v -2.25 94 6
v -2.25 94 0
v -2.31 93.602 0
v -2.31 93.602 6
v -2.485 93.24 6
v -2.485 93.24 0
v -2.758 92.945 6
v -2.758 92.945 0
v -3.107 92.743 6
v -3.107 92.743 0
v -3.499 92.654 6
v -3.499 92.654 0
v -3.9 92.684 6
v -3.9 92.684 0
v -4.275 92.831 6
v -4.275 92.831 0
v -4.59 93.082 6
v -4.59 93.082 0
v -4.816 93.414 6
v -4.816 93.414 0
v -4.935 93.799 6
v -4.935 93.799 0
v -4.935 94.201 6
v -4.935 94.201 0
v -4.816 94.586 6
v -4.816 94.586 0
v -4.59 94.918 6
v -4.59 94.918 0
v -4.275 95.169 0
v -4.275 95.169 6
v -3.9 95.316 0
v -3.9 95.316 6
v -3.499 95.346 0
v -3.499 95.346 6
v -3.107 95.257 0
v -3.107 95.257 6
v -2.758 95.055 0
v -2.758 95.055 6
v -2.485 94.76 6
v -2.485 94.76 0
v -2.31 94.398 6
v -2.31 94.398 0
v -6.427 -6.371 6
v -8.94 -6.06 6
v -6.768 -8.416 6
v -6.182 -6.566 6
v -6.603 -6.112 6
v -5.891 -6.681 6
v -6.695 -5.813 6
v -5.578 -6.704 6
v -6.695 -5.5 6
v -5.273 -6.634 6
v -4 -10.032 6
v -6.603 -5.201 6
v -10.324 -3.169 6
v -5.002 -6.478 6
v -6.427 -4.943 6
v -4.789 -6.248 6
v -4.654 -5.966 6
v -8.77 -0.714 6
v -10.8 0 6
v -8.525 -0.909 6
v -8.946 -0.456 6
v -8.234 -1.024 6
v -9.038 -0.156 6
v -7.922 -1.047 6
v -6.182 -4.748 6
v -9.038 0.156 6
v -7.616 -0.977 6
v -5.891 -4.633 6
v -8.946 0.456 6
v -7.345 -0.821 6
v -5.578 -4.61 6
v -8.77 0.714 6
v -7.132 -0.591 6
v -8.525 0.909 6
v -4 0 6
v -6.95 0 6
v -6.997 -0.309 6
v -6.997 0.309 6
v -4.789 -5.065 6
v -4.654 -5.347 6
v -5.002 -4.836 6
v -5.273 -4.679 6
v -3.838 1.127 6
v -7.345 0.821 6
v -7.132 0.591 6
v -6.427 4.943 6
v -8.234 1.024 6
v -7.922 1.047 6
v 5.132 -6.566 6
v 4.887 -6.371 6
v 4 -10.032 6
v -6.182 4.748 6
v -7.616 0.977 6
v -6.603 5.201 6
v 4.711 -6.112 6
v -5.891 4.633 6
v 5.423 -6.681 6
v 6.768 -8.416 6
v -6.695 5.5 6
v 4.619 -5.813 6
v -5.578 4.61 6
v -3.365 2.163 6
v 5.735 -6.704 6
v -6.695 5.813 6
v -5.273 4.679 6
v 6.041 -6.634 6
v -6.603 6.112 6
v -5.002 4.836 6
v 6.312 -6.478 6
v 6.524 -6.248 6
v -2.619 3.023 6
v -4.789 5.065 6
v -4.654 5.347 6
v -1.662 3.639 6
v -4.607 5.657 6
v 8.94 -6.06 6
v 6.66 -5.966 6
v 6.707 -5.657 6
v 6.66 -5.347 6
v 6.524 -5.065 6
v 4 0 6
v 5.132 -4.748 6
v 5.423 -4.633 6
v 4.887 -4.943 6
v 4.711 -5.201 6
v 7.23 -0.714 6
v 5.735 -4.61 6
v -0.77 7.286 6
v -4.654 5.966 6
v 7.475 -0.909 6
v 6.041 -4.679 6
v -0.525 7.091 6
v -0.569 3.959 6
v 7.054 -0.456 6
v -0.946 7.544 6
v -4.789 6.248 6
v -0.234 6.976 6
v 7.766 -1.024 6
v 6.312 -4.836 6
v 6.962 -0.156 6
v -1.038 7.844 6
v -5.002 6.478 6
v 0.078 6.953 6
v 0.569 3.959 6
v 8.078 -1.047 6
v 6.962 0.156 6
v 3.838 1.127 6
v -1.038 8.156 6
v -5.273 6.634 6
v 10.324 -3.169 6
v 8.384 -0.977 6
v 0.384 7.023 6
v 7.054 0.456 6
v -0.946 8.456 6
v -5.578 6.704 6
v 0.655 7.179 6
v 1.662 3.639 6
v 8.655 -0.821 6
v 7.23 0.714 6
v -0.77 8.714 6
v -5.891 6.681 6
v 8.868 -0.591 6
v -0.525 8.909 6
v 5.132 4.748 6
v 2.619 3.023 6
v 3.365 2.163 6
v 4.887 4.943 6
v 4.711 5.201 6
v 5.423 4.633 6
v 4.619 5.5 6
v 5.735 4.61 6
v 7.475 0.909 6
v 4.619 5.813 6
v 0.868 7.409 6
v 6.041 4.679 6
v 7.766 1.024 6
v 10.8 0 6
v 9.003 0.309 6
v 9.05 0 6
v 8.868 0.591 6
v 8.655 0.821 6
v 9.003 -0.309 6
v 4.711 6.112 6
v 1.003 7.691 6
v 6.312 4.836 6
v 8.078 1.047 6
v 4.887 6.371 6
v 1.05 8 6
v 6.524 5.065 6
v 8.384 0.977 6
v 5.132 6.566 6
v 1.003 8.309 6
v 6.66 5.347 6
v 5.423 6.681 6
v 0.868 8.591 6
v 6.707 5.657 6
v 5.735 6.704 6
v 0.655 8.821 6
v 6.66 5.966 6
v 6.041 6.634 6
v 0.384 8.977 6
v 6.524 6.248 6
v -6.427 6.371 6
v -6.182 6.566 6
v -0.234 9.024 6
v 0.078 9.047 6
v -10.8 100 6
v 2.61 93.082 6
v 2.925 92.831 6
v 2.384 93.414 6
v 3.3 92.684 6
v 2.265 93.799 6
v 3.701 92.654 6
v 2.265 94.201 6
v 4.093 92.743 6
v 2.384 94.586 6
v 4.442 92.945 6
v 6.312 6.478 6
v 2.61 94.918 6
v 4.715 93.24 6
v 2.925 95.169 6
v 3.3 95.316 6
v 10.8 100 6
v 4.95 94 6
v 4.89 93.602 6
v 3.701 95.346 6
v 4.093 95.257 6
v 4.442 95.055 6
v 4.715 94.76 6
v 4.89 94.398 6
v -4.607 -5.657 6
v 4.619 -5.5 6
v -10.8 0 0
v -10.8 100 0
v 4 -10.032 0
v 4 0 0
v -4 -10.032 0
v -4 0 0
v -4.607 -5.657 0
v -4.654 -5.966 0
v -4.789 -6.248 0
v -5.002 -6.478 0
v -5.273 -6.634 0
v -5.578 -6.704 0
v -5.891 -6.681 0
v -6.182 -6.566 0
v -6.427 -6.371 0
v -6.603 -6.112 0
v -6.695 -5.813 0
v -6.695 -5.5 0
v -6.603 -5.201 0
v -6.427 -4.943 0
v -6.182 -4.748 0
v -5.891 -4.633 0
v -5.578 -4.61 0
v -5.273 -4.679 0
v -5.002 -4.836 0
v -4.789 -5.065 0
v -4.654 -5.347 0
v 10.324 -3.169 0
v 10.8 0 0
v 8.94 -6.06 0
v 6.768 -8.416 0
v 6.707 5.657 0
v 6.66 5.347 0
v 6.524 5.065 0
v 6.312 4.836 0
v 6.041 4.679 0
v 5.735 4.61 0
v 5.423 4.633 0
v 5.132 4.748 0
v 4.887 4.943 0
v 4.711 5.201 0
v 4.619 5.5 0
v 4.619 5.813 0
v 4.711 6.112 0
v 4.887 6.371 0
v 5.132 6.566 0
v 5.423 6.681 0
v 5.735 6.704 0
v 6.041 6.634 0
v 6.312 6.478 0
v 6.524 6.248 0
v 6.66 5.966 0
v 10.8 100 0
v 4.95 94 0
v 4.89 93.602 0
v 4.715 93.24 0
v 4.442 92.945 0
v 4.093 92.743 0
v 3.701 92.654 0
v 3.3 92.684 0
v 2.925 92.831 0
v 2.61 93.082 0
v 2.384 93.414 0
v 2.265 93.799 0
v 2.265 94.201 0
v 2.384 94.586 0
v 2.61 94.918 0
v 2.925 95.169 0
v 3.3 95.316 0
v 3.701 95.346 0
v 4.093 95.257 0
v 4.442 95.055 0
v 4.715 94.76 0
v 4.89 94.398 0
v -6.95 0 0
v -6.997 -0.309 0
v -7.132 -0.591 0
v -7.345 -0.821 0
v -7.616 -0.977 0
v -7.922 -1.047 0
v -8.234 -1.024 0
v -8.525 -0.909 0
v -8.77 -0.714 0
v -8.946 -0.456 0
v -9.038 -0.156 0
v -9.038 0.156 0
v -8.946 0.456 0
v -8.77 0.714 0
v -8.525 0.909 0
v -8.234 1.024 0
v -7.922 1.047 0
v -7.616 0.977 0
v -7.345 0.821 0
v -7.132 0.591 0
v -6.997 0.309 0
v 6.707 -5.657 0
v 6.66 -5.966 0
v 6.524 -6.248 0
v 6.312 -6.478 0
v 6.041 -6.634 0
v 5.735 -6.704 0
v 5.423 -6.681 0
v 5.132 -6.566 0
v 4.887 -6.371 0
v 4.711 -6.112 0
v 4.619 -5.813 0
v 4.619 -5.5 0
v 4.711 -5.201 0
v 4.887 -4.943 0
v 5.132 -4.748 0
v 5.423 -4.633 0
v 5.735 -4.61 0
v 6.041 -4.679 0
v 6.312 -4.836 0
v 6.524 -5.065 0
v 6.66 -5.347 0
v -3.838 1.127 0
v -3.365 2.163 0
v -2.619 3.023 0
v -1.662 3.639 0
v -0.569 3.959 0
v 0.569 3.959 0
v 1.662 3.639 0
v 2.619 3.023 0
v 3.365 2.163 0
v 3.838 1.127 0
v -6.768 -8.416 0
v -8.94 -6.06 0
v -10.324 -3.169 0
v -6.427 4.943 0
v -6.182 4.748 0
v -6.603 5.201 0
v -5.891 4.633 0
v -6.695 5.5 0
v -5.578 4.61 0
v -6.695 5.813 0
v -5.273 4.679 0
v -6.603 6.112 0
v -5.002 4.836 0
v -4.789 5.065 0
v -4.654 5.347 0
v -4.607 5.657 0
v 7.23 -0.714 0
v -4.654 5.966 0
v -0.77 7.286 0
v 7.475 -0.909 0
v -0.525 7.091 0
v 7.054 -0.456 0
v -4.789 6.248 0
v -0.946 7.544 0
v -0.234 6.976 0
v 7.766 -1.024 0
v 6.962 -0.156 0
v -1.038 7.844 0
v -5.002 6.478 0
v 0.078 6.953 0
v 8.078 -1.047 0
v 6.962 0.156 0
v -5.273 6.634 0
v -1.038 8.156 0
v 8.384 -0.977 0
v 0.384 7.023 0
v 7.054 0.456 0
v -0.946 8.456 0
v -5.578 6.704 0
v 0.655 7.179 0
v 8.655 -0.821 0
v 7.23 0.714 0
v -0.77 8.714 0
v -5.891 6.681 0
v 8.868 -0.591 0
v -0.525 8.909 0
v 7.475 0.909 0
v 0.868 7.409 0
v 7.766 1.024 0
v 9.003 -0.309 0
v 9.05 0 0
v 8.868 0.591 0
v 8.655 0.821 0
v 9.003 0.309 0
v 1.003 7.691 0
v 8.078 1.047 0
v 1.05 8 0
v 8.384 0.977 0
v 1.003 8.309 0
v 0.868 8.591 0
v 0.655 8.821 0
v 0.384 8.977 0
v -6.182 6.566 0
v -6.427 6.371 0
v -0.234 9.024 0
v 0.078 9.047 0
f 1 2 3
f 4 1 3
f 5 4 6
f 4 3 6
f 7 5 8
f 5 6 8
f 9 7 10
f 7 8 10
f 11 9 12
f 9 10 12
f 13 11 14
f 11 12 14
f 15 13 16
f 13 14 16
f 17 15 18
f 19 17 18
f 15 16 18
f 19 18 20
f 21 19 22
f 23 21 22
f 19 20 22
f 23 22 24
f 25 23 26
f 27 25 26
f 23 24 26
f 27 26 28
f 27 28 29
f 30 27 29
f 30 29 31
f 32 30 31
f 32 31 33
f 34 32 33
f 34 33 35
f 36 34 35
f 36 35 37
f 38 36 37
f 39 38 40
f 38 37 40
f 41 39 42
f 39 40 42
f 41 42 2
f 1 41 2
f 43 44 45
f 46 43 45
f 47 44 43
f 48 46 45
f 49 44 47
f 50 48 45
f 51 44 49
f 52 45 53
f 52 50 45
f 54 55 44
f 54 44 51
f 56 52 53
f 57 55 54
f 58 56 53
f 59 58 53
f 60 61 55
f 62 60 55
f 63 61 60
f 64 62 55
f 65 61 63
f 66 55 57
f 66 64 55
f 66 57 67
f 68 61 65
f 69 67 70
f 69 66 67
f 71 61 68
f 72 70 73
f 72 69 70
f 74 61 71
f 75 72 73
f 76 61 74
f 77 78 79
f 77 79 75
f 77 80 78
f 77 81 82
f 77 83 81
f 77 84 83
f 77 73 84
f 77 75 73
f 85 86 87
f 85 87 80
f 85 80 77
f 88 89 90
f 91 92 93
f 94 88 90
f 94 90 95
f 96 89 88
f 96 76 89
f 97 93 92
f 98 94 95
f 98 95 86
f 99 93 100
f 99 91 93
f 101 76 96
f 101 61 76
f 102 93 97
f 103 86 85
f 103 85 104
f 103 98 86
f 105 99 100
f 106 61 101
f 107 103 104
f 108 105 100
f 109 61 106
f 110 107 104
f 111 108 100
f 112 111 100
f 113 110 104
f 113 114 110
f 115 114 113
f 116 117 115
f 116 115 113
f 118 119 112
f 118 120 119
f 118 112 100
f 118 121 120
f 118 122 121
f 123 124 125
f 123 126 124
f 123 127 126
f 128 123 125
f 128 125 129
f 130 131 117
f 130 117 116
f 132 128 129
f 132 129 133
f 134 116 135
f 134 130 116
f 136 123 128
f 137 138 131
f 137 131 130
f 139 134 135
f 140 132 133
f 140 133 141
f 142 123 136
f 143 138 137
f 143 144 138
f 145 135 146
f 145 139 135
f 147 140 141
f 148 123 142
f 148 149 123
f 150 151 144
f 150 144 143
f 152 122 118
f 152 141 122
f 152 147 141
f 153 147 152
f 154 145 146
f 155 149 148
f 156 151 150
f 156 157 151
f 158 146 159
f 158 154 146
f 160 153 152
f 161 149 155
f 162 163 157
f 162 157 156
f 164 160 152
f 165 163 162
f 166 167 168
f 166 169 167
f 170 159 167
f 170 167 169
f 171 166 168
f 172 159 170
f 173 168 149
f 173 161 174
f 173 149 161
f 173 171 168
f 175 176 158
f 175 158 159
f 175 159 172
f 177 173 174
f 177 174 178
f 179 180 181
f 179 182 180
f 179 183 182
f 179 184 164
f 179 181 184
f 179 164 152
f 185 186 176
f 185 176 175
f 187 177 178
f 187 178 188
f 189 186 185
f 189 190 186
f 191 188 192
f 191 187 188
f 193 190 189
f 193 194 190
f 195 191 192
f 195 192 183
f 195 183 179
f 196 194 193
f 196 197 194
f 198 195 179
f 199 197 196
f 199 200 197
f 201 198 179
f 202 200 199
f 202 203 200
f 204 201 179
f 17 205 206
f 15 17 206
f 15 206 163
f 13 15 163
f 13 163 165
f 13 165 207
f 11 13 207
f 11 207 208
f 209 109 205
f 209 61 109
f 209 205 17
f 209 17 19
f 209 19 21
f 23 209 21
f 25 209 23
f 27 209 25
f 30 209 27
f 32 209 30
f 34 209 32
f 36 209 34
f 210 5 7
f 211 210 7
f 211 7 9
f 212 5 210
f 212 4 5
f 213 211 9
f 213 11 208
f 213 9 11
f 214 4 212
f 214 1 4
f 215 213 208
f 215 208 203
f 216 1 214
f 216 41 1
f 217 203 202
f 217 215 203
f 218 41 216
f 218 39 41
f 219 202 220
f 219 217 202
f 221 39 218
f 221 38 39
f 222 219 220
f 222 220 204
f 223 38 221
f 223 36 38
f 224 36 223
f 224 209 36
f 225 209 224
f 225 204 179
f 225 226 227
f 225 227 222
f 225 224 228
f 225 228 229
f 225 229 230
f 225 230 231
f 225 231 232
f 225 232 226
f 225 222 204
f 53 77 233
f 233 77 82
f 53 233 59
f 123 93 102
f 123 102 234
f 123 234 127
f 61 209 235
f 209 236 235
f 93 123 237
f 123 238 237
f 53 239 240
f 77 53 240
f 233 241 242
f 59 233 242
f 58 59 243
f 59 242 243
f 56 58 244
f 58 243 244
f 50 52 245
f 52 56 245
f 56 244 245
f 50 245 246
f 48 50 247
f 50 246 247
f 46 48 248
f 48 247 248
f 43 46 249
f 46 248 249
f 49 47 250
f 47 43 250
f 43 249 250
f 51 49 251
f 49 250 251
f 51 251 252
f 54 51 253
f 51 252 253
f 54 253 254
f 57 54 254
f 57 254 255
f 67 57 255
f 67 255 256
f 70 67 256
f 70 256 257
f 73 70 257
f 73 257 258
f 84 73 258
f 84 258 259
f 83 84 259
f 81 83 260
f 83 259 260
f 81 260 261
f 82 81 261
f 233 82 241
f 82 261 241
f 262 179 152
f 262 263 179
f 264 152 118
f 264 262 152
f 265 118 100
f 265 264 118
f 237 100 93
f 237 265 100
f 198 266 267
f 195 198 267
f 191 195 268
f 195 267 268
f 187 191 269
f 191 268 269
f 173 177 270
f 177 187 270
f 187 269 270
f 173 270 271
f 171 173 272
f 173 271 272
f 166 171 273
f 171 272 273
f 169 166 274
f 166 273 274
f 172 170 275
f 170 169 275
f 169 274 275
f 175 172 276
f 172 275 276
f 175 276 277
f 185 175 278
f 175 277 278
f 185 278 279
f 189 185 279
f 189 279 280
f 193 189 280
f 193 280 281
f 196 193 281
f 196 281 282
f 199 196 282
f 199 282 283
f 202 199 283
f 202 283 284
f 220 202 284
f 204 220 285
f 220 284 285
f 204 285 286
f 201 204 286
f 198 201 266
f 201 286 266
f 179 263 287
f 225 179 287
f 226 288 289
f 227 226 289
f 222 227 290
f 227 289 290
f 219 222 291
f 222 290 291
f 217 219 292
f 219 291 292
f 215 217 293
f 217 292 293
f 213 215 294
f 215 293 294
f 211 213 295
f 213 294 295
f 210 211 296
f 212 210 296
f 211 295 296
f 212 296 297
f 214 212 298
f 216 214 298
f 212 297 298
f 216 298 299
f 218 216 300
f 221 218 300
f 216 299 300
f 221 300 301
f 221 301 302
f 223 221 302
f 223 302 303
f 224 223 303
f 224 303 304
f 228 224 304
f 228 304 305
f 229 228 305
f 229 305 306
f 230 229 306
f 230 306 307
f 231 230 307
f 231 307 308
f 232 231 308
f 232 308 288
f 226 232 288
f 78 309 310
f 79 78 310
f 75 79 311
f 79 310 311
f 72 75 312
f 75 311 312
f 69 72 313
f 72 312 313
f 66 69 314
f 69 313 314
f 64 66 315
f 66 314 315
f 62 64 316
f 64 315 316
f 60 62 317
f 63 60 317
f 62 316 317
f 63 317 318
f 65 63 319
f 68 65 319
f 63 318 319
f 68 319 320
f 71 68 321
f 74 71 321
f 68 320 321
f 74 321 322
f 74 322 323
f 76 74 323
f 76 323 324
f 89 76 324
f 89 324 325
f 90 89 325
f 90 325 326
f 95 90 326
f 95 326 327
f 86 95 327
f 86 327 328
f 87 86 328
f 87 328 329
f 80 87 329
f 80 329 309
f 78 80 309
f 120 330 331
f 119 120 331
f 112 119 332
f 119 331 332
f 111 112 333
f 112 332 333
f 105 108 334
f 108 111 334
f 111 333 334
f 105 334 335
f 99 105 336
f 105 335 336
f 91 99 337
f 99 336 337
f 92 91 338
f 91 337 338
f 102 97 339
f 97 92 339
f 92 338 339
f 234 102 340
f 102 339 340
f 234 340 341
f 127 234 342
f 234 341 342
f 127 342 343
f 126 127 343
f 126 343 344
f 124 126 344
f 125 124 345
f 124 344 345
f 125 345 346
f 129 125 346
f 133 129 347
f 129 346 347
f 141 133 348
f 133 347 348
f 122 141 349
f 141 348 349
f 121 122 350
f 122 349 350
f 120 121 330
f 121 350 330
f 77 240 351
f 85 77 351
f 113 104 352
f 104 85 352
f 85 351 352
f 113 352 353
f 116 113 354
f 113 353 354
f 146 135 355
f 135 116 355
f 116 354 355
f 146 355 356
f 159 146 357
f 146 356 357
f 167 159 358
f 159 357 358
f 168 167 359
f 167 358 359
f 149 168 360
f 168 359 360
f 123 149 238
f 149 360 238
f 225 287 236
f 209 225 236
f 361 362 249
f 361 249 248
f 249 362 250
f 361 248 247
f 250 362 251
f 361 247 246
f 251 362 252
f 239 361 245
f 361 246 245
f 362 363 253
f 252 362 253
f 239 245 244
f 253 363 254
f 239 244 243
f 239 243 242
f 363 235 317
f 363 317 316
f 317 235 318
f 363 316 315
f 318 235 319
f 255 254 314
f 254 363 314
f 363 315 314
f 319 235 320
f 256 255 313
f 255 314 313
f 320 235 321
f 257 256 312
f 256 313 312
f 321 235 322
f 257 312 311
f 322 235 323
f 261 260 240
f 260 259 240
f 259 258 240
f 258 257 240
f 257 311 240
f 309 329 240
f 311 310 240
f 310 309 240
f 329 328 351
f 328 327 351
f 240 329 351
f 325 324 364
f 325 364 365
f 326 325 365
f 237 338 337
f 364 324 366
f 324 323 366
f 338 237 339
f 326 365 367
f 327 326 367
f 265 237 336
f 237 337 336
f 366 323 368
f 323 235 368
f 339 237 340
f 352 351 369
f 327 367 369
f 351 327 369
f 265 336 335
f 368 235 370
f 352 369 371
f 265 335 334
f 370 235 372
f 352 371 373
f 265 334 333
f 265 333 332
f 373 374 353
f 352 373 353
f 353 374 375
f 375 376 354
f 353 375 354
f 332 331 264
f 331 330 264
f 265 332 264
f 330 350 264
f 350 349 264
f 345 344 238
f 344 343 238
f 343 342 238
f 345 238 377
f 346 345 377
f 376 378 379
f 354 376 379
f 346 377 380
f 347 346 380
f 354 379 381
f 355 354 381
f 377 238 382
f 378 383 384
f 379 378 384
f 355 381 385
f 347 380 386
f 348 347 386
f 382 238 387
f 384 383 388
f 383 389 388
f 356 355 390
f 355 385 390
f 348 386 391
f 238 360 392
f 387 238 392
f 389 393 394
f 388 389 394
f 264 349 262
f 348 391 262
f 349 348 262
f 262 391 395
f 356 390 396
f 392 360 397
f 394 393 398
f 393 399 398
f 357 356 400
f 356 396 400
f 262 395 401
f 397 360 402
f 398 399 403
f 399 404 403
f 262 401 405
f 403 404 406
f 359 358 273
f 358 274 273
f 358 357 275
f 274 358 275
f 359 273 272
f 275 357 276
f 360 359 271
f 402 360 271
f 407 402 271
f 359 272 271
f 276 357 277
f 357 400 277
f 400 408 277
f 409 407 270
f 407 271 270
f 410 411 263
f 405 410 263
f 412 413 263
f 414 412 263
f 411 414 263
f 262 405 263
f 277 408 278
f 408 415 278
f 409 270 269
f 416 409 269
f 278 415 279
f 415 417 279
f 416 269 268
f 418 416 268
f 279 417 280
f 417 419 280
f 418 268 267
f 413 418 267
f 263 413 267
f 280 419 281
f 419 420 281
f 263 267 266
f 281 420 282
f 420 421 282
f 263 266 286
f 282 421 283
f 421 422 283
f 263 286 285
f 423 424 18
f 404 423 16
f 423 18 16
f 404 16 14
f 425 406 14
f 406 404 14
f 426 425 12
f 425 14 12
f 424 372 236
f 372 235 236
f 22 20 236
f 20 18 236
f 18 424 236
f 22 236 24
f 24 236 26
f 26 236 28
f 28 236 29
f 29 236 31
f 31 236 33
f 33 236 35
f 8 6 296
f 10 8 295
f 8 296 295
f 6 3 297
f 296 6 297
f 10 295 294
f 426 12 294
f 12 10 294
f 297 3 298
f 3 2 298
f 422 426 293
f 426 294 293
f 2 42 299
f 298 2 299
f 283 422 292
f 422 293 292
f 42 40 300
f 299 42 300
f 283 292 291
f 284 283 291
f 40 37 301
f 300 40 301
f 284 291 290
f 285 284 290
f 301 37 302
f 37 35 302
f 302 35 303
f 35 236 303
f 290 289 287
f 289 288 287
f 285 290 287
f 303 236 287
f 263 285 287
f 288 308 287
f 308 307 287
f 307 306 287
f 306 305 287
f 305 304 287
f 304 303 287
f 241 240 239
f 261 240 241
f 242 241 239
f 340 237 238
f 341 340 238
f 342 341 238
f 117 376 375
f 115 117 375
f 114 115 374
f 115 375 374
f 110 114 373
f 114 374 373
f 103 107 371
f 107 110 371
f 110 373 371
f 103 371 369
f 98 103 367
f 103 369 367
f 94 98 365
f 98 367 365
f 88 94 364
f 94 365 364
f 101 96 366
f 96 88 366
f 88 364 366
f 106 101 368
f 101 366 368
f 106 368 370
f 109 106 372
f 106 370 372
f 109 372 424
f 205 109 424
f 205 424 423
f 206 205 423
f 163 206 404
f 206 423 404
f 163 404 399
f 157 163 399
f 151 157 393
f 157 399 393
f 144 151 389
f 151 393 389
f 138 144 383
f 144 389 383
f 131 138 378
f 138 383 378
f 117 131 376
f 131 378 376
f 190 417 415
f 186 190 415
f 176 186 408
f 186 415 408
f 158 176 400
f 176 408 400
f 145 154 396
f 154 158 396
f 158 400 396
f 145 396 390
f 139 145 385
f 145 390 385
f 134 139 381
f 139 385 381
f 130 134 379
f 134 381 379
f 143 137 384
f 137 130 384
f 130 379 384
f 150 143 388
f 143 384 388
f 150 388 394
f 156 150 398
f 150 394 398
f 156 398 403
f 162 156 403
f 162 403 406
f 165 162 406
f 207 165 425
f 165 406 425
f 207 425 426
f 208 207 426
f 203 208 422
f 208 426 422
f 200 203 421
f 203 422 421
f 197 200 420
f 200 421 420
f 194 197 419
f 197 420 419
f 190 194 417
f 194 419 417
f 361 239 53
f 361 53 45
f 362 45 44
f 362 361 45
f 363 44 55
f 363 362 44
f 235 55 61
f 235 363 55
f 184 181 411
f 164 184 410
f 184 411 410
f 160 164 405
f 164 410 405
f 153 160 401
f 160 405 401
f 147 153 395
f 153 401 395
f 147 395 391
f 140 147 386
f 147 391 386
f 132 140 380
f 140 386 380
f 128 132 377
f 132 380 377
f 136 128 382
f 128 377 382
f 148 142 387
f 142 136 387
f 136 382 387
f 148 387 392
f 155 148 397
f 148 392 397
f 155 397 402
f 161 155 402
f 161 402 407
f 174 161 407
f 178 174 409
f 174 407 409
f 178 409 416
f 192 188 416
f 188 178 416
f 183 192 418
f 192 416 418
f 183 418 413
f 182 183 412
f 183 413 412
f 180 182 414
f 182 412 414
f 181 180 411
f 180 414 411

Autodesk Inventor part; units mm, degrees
ref_plane "YZ Plane" through (0, 0, 0) normal (1, 0, 0) x (0, 1, 0)
ref_plane "XZ Plane" through (0, 0, 0) normal (0, 1, 0) x (-1, 0, 0)
ref_plane "XY Plane" through (0, 0, 0) normal (0, 0, 1) x (1, 0, 0)
sketch "스케치1" plane through (0, 0, 0) normal (0, 0, 1) x (1, 0, 0)
  circle A0 centre (0, 0) radius 10.8 projected
  circle A1 centre (0, 0) radius 6 projected
  circle A2 centre (0, -8) radius 1.05 projected
  circle A3 centre (-5.6569, -5.6569) radius 1.05 projected
  circle A4 centre (-8, 0) radius 1.05 projected
  circle A5 centre (-5.6569, 5.6569) radius 1.05 projected
  circle A6 centre (0, 8) radius 1.05 projected
  circle A7 centre (5.6569, 5.6569) radius 1.05 projected
  circle A8 centre (8, 0) radius 1.05 projected
  circle A9 centre (5.6569, -5.6569) radius 1.05 projected
  circle A10 centre (0, 0) radius 3.6 projected
  circle A11 centre (0, 0) radius 3.6 projected
  circle A12 centre (0, 0) radius 4
  line L0 (-4, 0) -> (4, 0)
  line L1 (4, 0) -> (4, -13.3653)
  line L2 (4, -13.3653) -> (-4, -13.3653)
  line L3 (-4, -13.3653) -> (-4, 0)
  line L4 (-10.8, 0) -> (10.8, 0)
  line L5 (10.8, 0) -> (10.8, 100)
  line L6 (10.8, 100) -> (-10.8, 100)
  line L7 (-10.8, 100) -> (-10.8, 0)
  line L8 (10.8, 100) -> (10.8, 94)
  line L9 (10.8, 94) -> (3.6, 94)
  line L10 (3.6, 94) -> (-3.6, 94)
  line L11 (-3.6, 94) -> (-10.8, 94)
  circle A13 centre (-3.6, 94) radius 1.35
  circle A14 centre (3.6, 94) radius 1.35
  point P0 (0, 0)
  point P1 (-3.6, 0)
  point P2 (3.6, 0)
  point P3 (-4, -10.0319)
  point P4 (4, -10.0319)
  dimension "d0" = 8
  dimension "d1" = 100
  dimension "d2" = 21.6
  dimension "d3" = 6
  dimension "d4" = 7.2
  dimension "d5" = 7.2
  dimension "d6" = 2.7
  dimension "d7" = 2.7
extrude "돌출1" add sketch "스케치1" along normal blind 6 contours L4 A8 A1 A4 A0 | A0 L1 A1 L4 A8 | A0 L7 L11 A13 L10 A14 L9 L5 | L4 A4 A1 L3 A0 | L9 A14 L10 A13 L11 L7 L6 L5 | L1 L4 A1 | A1 L4 L3 | L4 A12 A1
properties part number "_hand_adt_ver_2_" material "PMMA 플라스틱"
